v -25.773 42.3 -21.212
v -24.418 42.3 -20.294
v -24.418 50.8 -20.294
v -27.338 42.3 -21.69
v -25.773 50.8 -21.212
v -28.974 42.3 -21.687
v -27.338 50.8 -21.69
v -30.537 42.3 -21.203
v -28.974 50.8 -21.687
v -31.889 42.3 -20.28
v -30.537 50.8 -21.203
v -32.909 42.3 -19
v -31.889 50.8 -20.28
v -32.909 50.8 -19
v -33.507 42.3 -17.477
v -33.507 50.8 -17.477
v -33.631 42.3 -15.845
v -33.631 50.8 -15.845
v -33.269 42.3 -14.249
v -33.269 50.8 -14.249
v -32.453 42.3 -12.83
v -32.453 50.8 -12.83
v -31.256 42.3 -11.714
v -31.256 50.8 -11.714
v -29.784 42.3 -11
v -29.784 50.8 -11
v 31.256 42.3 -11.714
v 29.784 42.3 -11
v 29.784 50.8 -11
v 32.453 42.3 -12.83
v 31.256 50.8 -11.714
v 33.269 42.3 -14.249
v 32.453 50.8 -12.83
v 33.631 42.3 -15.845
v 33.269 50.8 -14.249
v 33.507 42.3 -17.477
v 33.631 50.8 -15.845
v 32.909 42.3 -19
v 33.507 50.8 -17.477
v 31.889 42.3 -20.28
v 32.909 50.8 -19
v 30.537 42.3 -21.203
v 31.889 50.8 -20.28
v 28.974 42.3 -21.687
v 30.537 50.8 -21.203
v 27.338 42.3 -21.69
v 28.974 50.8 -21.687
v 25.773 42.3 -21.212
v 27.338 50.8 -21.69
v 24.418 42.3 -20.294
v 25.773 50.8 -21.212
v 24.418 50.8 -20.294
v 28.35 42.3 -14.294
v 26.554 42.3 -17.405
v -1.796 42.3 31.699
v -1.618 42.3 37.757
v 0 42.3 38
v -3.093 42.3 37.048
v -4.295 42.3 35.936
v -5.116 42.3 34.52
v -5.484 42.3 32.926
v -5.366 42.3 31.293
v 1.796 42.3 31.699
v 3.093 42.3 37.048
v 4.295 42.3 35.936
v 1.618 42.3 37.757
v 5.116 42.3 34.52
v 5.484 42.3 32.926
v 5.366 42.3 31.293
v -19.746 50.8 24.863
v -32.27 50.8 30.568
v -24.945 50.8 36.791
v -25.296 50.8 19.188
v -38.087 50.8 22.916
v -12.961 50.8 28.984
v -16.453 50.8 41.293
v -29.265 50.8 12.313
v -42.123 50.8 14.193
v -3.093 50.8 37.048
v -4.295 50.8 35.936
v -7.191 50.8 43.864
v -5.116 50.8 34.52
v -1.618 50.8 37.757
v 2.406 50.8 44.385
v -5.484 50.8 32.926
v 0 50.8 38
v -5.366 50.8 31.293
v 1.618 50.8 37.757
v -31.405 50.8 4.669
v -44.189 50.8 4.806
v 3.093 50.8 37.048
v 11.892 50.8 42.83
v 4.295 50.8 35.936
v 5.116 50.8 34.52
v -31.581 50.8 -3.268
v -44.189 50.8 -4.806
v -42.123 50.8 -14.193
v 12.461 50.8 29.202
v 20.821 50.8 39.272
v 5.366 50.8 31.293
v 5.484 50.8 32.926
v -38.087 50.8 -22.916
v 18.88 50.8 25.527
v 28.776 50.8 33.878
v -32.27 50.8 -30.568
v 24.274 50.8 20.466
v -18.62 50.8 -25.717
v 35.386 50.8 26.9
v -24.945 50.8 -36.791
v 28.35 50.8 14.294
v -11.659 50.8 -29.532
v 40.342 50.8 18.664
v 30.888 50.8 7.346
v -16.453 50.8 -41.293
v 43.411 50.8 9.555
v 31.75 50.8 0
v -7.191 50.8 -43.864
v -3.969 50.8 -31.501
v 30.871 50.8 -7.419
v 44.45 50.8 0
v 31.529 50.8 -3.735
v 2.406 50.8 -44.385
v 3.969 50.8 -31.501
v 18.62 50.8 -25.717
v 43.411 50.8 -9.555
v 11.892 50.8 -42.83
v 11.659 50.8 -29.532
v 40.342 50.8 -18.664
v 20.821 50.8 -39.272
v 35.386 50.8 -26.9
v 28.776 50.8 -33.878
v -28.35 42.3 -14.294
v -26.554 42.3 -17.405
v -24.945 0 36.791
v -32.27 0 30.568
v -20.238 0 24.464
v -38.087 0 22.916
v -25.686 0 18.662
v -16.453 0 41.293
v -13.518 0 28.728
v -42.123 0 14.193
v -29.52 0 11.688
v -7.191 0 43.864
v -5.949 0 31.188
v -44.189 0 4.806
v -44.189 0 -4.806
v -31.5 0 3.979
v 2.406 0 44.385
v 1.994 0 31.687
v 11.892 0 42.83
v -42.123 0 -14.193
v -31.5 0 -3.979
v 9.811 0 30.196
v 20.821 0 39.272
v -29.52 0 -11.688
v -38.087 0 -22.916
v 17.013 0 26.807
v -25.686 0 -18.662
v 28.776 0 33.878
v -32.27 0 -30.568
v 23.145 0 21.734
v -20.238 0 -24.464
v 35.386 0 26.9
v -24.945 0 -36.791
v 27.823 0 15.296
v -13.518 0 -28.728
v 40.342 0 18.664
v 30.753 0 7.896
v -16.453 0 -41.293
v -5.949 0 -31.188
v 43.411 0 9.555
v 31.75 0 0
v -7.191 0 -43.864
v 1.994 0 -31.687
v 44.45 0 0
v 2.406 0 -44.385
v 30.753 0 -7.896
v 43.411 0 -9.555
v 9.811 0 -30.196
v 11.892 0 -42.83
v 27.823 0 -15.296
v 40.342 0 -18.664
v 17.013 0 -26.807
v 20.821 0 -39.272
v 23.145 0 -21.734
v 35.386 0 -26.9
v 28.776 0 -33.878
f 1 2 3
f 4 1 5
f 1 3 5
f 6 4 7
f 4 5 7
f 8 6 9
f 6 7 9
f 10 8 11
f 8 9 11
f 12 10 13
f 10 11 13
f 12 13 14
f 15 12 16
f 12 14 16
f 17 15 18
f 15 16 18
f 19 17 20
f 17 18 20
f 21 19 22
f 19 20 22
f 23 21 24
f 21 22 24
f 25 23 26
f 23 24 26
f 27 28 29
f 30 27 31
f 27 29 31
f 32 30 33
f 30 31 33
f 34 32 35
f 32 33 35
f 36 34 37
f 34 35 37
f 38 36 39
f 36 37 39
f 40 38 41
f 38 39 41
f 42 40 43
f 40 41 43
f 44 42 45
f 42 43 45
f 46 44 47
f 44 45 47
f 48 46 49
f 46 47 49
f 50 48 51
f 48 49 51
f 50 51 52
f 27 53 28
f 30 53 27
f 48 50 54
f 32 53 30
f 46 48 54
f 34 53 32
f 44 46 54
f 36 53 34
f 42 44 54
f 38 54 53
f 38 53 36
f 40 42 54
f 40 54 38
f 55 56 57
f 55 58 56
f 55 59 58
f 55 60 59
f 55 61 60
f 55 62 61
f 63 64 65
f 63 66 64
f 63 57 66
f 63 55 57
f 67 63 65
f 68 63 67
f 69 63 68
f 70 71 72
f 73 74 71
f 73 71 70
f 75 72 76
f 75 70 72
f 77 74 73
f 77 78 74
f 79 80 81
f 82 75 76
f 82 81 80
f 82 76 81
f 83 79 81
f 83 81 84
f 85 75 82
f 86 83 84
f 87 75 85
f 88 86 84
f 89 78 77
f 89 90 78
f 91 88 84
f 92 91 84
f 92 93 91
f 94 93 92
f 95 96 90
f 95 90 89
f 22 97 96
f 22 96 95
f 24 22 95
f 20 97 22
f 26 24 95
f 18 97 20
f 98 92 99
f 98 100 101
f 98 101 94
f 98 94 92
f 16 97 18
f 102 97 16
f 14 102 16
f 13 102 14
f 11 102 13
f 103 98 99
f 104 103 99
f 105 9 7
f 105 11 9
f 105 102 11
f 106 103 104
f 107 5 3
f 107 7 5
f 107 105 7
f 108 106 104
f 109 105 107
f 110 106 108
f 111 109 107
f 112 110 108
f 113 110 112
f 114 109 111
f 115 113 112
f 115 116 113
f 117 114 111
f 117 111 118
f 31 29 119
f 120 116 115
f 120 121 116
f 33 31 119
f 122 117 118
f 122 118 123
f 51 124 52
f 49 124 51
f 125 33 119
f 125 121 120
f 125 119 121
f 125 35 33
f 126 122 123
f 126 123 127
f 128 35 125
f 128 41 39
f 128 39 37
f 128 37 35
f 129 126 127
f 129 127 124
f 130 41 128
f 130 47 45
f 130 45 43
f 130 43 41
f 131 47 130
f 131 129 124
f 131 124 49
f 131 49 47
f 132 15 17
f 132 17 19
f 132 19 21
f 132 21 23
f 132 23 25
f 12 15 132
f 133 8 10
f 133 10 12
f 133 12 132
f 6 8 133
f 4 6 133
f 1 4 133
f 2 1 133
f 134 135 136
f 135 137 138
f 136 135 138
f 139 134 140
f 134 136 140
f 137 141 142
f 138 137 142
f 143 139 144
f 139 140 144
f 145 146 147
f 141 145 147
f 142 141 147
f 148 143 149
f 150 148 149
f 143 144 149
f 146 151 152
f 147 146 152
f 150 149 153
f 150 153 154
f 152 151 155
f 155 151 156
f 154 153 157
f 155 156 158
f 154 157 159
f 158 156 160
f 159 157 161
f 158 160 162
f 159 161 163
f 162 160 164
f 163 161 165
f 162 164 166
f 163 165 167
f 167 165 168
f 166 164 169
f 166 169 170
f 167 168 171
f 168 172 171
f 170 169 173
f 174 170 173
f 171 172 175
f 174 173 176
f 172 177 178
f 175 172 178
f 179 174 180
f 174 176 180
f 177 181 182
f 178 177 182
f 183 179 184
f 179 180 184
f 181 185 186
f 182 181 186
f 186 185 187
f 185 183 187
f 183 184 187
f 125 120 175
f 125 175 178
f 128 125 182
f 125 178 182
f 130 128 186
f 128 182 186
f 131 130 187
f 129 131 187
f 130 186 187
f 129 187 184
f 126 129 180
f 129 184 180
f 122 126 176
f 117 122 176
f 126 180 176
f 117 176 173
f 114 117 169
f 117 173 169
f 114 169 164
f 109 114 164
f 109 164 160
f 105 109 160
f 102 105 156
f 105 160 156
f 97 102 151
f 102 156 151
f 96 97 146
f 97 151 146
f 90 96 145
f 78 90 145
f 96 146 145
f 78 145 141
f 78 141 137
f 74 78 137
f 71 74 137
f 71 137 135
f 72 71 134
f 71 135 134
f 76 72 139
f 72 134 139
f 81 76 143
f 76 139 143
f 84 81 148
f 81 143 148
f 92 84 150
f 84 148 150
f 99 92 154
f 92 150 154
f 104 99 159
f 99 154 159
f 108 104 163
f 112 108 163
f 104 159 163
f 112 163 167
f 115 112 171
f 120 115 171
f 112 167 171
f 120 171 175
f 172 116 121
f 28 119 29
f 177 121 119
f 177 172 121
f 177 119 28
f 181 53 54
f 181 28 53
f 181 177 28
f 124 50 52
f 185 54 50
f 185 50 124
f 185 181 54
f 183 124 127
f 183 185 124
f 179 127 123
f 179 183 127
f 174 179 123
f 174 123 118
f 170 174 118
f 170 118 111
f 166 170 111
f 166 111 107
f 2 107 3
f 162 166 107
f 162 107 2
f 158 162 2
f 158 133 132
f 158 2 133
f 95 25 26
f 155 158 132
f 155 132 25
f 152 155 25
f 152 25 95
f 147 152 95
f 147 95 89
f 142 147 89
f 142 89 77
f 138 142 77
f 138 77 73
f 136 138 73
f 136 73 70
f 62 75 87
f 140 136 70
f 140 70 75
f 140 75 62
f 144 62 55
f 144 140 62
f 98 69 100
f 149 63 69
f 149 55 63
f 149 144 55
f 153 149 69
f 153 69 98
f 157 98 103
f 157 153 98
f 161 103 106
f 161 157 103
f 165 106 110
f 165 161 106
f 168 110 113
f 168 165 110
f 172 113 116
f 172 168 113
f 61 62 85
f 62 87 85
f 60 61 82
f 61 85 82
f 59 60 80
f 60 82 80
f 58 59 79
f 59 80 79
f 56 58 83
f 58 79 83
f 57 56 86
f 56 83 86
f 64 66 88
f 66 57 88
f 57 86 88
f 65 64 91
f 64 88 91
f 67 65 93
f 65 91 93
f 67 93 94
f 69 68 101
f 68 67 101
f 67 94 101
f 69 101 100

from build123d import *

# Parameters (mm, degrees)
SKETCH1_R           = 44.45
SKETCH1_R_2         = 31.75
BOSS_EXTRUDE1_DEPTH = 50.8
SKETCH3_R           = 5.5
CUT_EXTRUDE2_DEPTH  = 8.5


with BuildPart() as part:
    # Sketch1 → Boss-Extrude1 (new body)
    with BuildSketch(Plane(origin=(0, 0, 0), x_dir=(1, 0, 0), z_dir=(0, 1, 0))):
        Circle(SKETCH1_R)
        Circle(SKETCH1_R_2, mode=Mode.SUBTRACT)
    extrude(amount=BOSS_EXTRUDE1_DEPTH)

    # Sketch3 → Cut-Extrude2 (cut)
    with BuildSketch(Plane(origin=(0, 50.8, 0), x_dir=(1, 0, 0), z_dir=(0, 1, 0))):
        with Locations((-28.145825623, 16.25)):
            Circle(SKETCH3_R)
        with Locations((0, -32.5)):
            Circle(SKETCH3_R)
        with Locations((28.145825623, 16.25)):
            Circle(SKETCH3_R)
    extrude(amount=-CUT_EXTRUDE2_DEPTH, mode=Mode.SUBTRACT)


solid = part.part
